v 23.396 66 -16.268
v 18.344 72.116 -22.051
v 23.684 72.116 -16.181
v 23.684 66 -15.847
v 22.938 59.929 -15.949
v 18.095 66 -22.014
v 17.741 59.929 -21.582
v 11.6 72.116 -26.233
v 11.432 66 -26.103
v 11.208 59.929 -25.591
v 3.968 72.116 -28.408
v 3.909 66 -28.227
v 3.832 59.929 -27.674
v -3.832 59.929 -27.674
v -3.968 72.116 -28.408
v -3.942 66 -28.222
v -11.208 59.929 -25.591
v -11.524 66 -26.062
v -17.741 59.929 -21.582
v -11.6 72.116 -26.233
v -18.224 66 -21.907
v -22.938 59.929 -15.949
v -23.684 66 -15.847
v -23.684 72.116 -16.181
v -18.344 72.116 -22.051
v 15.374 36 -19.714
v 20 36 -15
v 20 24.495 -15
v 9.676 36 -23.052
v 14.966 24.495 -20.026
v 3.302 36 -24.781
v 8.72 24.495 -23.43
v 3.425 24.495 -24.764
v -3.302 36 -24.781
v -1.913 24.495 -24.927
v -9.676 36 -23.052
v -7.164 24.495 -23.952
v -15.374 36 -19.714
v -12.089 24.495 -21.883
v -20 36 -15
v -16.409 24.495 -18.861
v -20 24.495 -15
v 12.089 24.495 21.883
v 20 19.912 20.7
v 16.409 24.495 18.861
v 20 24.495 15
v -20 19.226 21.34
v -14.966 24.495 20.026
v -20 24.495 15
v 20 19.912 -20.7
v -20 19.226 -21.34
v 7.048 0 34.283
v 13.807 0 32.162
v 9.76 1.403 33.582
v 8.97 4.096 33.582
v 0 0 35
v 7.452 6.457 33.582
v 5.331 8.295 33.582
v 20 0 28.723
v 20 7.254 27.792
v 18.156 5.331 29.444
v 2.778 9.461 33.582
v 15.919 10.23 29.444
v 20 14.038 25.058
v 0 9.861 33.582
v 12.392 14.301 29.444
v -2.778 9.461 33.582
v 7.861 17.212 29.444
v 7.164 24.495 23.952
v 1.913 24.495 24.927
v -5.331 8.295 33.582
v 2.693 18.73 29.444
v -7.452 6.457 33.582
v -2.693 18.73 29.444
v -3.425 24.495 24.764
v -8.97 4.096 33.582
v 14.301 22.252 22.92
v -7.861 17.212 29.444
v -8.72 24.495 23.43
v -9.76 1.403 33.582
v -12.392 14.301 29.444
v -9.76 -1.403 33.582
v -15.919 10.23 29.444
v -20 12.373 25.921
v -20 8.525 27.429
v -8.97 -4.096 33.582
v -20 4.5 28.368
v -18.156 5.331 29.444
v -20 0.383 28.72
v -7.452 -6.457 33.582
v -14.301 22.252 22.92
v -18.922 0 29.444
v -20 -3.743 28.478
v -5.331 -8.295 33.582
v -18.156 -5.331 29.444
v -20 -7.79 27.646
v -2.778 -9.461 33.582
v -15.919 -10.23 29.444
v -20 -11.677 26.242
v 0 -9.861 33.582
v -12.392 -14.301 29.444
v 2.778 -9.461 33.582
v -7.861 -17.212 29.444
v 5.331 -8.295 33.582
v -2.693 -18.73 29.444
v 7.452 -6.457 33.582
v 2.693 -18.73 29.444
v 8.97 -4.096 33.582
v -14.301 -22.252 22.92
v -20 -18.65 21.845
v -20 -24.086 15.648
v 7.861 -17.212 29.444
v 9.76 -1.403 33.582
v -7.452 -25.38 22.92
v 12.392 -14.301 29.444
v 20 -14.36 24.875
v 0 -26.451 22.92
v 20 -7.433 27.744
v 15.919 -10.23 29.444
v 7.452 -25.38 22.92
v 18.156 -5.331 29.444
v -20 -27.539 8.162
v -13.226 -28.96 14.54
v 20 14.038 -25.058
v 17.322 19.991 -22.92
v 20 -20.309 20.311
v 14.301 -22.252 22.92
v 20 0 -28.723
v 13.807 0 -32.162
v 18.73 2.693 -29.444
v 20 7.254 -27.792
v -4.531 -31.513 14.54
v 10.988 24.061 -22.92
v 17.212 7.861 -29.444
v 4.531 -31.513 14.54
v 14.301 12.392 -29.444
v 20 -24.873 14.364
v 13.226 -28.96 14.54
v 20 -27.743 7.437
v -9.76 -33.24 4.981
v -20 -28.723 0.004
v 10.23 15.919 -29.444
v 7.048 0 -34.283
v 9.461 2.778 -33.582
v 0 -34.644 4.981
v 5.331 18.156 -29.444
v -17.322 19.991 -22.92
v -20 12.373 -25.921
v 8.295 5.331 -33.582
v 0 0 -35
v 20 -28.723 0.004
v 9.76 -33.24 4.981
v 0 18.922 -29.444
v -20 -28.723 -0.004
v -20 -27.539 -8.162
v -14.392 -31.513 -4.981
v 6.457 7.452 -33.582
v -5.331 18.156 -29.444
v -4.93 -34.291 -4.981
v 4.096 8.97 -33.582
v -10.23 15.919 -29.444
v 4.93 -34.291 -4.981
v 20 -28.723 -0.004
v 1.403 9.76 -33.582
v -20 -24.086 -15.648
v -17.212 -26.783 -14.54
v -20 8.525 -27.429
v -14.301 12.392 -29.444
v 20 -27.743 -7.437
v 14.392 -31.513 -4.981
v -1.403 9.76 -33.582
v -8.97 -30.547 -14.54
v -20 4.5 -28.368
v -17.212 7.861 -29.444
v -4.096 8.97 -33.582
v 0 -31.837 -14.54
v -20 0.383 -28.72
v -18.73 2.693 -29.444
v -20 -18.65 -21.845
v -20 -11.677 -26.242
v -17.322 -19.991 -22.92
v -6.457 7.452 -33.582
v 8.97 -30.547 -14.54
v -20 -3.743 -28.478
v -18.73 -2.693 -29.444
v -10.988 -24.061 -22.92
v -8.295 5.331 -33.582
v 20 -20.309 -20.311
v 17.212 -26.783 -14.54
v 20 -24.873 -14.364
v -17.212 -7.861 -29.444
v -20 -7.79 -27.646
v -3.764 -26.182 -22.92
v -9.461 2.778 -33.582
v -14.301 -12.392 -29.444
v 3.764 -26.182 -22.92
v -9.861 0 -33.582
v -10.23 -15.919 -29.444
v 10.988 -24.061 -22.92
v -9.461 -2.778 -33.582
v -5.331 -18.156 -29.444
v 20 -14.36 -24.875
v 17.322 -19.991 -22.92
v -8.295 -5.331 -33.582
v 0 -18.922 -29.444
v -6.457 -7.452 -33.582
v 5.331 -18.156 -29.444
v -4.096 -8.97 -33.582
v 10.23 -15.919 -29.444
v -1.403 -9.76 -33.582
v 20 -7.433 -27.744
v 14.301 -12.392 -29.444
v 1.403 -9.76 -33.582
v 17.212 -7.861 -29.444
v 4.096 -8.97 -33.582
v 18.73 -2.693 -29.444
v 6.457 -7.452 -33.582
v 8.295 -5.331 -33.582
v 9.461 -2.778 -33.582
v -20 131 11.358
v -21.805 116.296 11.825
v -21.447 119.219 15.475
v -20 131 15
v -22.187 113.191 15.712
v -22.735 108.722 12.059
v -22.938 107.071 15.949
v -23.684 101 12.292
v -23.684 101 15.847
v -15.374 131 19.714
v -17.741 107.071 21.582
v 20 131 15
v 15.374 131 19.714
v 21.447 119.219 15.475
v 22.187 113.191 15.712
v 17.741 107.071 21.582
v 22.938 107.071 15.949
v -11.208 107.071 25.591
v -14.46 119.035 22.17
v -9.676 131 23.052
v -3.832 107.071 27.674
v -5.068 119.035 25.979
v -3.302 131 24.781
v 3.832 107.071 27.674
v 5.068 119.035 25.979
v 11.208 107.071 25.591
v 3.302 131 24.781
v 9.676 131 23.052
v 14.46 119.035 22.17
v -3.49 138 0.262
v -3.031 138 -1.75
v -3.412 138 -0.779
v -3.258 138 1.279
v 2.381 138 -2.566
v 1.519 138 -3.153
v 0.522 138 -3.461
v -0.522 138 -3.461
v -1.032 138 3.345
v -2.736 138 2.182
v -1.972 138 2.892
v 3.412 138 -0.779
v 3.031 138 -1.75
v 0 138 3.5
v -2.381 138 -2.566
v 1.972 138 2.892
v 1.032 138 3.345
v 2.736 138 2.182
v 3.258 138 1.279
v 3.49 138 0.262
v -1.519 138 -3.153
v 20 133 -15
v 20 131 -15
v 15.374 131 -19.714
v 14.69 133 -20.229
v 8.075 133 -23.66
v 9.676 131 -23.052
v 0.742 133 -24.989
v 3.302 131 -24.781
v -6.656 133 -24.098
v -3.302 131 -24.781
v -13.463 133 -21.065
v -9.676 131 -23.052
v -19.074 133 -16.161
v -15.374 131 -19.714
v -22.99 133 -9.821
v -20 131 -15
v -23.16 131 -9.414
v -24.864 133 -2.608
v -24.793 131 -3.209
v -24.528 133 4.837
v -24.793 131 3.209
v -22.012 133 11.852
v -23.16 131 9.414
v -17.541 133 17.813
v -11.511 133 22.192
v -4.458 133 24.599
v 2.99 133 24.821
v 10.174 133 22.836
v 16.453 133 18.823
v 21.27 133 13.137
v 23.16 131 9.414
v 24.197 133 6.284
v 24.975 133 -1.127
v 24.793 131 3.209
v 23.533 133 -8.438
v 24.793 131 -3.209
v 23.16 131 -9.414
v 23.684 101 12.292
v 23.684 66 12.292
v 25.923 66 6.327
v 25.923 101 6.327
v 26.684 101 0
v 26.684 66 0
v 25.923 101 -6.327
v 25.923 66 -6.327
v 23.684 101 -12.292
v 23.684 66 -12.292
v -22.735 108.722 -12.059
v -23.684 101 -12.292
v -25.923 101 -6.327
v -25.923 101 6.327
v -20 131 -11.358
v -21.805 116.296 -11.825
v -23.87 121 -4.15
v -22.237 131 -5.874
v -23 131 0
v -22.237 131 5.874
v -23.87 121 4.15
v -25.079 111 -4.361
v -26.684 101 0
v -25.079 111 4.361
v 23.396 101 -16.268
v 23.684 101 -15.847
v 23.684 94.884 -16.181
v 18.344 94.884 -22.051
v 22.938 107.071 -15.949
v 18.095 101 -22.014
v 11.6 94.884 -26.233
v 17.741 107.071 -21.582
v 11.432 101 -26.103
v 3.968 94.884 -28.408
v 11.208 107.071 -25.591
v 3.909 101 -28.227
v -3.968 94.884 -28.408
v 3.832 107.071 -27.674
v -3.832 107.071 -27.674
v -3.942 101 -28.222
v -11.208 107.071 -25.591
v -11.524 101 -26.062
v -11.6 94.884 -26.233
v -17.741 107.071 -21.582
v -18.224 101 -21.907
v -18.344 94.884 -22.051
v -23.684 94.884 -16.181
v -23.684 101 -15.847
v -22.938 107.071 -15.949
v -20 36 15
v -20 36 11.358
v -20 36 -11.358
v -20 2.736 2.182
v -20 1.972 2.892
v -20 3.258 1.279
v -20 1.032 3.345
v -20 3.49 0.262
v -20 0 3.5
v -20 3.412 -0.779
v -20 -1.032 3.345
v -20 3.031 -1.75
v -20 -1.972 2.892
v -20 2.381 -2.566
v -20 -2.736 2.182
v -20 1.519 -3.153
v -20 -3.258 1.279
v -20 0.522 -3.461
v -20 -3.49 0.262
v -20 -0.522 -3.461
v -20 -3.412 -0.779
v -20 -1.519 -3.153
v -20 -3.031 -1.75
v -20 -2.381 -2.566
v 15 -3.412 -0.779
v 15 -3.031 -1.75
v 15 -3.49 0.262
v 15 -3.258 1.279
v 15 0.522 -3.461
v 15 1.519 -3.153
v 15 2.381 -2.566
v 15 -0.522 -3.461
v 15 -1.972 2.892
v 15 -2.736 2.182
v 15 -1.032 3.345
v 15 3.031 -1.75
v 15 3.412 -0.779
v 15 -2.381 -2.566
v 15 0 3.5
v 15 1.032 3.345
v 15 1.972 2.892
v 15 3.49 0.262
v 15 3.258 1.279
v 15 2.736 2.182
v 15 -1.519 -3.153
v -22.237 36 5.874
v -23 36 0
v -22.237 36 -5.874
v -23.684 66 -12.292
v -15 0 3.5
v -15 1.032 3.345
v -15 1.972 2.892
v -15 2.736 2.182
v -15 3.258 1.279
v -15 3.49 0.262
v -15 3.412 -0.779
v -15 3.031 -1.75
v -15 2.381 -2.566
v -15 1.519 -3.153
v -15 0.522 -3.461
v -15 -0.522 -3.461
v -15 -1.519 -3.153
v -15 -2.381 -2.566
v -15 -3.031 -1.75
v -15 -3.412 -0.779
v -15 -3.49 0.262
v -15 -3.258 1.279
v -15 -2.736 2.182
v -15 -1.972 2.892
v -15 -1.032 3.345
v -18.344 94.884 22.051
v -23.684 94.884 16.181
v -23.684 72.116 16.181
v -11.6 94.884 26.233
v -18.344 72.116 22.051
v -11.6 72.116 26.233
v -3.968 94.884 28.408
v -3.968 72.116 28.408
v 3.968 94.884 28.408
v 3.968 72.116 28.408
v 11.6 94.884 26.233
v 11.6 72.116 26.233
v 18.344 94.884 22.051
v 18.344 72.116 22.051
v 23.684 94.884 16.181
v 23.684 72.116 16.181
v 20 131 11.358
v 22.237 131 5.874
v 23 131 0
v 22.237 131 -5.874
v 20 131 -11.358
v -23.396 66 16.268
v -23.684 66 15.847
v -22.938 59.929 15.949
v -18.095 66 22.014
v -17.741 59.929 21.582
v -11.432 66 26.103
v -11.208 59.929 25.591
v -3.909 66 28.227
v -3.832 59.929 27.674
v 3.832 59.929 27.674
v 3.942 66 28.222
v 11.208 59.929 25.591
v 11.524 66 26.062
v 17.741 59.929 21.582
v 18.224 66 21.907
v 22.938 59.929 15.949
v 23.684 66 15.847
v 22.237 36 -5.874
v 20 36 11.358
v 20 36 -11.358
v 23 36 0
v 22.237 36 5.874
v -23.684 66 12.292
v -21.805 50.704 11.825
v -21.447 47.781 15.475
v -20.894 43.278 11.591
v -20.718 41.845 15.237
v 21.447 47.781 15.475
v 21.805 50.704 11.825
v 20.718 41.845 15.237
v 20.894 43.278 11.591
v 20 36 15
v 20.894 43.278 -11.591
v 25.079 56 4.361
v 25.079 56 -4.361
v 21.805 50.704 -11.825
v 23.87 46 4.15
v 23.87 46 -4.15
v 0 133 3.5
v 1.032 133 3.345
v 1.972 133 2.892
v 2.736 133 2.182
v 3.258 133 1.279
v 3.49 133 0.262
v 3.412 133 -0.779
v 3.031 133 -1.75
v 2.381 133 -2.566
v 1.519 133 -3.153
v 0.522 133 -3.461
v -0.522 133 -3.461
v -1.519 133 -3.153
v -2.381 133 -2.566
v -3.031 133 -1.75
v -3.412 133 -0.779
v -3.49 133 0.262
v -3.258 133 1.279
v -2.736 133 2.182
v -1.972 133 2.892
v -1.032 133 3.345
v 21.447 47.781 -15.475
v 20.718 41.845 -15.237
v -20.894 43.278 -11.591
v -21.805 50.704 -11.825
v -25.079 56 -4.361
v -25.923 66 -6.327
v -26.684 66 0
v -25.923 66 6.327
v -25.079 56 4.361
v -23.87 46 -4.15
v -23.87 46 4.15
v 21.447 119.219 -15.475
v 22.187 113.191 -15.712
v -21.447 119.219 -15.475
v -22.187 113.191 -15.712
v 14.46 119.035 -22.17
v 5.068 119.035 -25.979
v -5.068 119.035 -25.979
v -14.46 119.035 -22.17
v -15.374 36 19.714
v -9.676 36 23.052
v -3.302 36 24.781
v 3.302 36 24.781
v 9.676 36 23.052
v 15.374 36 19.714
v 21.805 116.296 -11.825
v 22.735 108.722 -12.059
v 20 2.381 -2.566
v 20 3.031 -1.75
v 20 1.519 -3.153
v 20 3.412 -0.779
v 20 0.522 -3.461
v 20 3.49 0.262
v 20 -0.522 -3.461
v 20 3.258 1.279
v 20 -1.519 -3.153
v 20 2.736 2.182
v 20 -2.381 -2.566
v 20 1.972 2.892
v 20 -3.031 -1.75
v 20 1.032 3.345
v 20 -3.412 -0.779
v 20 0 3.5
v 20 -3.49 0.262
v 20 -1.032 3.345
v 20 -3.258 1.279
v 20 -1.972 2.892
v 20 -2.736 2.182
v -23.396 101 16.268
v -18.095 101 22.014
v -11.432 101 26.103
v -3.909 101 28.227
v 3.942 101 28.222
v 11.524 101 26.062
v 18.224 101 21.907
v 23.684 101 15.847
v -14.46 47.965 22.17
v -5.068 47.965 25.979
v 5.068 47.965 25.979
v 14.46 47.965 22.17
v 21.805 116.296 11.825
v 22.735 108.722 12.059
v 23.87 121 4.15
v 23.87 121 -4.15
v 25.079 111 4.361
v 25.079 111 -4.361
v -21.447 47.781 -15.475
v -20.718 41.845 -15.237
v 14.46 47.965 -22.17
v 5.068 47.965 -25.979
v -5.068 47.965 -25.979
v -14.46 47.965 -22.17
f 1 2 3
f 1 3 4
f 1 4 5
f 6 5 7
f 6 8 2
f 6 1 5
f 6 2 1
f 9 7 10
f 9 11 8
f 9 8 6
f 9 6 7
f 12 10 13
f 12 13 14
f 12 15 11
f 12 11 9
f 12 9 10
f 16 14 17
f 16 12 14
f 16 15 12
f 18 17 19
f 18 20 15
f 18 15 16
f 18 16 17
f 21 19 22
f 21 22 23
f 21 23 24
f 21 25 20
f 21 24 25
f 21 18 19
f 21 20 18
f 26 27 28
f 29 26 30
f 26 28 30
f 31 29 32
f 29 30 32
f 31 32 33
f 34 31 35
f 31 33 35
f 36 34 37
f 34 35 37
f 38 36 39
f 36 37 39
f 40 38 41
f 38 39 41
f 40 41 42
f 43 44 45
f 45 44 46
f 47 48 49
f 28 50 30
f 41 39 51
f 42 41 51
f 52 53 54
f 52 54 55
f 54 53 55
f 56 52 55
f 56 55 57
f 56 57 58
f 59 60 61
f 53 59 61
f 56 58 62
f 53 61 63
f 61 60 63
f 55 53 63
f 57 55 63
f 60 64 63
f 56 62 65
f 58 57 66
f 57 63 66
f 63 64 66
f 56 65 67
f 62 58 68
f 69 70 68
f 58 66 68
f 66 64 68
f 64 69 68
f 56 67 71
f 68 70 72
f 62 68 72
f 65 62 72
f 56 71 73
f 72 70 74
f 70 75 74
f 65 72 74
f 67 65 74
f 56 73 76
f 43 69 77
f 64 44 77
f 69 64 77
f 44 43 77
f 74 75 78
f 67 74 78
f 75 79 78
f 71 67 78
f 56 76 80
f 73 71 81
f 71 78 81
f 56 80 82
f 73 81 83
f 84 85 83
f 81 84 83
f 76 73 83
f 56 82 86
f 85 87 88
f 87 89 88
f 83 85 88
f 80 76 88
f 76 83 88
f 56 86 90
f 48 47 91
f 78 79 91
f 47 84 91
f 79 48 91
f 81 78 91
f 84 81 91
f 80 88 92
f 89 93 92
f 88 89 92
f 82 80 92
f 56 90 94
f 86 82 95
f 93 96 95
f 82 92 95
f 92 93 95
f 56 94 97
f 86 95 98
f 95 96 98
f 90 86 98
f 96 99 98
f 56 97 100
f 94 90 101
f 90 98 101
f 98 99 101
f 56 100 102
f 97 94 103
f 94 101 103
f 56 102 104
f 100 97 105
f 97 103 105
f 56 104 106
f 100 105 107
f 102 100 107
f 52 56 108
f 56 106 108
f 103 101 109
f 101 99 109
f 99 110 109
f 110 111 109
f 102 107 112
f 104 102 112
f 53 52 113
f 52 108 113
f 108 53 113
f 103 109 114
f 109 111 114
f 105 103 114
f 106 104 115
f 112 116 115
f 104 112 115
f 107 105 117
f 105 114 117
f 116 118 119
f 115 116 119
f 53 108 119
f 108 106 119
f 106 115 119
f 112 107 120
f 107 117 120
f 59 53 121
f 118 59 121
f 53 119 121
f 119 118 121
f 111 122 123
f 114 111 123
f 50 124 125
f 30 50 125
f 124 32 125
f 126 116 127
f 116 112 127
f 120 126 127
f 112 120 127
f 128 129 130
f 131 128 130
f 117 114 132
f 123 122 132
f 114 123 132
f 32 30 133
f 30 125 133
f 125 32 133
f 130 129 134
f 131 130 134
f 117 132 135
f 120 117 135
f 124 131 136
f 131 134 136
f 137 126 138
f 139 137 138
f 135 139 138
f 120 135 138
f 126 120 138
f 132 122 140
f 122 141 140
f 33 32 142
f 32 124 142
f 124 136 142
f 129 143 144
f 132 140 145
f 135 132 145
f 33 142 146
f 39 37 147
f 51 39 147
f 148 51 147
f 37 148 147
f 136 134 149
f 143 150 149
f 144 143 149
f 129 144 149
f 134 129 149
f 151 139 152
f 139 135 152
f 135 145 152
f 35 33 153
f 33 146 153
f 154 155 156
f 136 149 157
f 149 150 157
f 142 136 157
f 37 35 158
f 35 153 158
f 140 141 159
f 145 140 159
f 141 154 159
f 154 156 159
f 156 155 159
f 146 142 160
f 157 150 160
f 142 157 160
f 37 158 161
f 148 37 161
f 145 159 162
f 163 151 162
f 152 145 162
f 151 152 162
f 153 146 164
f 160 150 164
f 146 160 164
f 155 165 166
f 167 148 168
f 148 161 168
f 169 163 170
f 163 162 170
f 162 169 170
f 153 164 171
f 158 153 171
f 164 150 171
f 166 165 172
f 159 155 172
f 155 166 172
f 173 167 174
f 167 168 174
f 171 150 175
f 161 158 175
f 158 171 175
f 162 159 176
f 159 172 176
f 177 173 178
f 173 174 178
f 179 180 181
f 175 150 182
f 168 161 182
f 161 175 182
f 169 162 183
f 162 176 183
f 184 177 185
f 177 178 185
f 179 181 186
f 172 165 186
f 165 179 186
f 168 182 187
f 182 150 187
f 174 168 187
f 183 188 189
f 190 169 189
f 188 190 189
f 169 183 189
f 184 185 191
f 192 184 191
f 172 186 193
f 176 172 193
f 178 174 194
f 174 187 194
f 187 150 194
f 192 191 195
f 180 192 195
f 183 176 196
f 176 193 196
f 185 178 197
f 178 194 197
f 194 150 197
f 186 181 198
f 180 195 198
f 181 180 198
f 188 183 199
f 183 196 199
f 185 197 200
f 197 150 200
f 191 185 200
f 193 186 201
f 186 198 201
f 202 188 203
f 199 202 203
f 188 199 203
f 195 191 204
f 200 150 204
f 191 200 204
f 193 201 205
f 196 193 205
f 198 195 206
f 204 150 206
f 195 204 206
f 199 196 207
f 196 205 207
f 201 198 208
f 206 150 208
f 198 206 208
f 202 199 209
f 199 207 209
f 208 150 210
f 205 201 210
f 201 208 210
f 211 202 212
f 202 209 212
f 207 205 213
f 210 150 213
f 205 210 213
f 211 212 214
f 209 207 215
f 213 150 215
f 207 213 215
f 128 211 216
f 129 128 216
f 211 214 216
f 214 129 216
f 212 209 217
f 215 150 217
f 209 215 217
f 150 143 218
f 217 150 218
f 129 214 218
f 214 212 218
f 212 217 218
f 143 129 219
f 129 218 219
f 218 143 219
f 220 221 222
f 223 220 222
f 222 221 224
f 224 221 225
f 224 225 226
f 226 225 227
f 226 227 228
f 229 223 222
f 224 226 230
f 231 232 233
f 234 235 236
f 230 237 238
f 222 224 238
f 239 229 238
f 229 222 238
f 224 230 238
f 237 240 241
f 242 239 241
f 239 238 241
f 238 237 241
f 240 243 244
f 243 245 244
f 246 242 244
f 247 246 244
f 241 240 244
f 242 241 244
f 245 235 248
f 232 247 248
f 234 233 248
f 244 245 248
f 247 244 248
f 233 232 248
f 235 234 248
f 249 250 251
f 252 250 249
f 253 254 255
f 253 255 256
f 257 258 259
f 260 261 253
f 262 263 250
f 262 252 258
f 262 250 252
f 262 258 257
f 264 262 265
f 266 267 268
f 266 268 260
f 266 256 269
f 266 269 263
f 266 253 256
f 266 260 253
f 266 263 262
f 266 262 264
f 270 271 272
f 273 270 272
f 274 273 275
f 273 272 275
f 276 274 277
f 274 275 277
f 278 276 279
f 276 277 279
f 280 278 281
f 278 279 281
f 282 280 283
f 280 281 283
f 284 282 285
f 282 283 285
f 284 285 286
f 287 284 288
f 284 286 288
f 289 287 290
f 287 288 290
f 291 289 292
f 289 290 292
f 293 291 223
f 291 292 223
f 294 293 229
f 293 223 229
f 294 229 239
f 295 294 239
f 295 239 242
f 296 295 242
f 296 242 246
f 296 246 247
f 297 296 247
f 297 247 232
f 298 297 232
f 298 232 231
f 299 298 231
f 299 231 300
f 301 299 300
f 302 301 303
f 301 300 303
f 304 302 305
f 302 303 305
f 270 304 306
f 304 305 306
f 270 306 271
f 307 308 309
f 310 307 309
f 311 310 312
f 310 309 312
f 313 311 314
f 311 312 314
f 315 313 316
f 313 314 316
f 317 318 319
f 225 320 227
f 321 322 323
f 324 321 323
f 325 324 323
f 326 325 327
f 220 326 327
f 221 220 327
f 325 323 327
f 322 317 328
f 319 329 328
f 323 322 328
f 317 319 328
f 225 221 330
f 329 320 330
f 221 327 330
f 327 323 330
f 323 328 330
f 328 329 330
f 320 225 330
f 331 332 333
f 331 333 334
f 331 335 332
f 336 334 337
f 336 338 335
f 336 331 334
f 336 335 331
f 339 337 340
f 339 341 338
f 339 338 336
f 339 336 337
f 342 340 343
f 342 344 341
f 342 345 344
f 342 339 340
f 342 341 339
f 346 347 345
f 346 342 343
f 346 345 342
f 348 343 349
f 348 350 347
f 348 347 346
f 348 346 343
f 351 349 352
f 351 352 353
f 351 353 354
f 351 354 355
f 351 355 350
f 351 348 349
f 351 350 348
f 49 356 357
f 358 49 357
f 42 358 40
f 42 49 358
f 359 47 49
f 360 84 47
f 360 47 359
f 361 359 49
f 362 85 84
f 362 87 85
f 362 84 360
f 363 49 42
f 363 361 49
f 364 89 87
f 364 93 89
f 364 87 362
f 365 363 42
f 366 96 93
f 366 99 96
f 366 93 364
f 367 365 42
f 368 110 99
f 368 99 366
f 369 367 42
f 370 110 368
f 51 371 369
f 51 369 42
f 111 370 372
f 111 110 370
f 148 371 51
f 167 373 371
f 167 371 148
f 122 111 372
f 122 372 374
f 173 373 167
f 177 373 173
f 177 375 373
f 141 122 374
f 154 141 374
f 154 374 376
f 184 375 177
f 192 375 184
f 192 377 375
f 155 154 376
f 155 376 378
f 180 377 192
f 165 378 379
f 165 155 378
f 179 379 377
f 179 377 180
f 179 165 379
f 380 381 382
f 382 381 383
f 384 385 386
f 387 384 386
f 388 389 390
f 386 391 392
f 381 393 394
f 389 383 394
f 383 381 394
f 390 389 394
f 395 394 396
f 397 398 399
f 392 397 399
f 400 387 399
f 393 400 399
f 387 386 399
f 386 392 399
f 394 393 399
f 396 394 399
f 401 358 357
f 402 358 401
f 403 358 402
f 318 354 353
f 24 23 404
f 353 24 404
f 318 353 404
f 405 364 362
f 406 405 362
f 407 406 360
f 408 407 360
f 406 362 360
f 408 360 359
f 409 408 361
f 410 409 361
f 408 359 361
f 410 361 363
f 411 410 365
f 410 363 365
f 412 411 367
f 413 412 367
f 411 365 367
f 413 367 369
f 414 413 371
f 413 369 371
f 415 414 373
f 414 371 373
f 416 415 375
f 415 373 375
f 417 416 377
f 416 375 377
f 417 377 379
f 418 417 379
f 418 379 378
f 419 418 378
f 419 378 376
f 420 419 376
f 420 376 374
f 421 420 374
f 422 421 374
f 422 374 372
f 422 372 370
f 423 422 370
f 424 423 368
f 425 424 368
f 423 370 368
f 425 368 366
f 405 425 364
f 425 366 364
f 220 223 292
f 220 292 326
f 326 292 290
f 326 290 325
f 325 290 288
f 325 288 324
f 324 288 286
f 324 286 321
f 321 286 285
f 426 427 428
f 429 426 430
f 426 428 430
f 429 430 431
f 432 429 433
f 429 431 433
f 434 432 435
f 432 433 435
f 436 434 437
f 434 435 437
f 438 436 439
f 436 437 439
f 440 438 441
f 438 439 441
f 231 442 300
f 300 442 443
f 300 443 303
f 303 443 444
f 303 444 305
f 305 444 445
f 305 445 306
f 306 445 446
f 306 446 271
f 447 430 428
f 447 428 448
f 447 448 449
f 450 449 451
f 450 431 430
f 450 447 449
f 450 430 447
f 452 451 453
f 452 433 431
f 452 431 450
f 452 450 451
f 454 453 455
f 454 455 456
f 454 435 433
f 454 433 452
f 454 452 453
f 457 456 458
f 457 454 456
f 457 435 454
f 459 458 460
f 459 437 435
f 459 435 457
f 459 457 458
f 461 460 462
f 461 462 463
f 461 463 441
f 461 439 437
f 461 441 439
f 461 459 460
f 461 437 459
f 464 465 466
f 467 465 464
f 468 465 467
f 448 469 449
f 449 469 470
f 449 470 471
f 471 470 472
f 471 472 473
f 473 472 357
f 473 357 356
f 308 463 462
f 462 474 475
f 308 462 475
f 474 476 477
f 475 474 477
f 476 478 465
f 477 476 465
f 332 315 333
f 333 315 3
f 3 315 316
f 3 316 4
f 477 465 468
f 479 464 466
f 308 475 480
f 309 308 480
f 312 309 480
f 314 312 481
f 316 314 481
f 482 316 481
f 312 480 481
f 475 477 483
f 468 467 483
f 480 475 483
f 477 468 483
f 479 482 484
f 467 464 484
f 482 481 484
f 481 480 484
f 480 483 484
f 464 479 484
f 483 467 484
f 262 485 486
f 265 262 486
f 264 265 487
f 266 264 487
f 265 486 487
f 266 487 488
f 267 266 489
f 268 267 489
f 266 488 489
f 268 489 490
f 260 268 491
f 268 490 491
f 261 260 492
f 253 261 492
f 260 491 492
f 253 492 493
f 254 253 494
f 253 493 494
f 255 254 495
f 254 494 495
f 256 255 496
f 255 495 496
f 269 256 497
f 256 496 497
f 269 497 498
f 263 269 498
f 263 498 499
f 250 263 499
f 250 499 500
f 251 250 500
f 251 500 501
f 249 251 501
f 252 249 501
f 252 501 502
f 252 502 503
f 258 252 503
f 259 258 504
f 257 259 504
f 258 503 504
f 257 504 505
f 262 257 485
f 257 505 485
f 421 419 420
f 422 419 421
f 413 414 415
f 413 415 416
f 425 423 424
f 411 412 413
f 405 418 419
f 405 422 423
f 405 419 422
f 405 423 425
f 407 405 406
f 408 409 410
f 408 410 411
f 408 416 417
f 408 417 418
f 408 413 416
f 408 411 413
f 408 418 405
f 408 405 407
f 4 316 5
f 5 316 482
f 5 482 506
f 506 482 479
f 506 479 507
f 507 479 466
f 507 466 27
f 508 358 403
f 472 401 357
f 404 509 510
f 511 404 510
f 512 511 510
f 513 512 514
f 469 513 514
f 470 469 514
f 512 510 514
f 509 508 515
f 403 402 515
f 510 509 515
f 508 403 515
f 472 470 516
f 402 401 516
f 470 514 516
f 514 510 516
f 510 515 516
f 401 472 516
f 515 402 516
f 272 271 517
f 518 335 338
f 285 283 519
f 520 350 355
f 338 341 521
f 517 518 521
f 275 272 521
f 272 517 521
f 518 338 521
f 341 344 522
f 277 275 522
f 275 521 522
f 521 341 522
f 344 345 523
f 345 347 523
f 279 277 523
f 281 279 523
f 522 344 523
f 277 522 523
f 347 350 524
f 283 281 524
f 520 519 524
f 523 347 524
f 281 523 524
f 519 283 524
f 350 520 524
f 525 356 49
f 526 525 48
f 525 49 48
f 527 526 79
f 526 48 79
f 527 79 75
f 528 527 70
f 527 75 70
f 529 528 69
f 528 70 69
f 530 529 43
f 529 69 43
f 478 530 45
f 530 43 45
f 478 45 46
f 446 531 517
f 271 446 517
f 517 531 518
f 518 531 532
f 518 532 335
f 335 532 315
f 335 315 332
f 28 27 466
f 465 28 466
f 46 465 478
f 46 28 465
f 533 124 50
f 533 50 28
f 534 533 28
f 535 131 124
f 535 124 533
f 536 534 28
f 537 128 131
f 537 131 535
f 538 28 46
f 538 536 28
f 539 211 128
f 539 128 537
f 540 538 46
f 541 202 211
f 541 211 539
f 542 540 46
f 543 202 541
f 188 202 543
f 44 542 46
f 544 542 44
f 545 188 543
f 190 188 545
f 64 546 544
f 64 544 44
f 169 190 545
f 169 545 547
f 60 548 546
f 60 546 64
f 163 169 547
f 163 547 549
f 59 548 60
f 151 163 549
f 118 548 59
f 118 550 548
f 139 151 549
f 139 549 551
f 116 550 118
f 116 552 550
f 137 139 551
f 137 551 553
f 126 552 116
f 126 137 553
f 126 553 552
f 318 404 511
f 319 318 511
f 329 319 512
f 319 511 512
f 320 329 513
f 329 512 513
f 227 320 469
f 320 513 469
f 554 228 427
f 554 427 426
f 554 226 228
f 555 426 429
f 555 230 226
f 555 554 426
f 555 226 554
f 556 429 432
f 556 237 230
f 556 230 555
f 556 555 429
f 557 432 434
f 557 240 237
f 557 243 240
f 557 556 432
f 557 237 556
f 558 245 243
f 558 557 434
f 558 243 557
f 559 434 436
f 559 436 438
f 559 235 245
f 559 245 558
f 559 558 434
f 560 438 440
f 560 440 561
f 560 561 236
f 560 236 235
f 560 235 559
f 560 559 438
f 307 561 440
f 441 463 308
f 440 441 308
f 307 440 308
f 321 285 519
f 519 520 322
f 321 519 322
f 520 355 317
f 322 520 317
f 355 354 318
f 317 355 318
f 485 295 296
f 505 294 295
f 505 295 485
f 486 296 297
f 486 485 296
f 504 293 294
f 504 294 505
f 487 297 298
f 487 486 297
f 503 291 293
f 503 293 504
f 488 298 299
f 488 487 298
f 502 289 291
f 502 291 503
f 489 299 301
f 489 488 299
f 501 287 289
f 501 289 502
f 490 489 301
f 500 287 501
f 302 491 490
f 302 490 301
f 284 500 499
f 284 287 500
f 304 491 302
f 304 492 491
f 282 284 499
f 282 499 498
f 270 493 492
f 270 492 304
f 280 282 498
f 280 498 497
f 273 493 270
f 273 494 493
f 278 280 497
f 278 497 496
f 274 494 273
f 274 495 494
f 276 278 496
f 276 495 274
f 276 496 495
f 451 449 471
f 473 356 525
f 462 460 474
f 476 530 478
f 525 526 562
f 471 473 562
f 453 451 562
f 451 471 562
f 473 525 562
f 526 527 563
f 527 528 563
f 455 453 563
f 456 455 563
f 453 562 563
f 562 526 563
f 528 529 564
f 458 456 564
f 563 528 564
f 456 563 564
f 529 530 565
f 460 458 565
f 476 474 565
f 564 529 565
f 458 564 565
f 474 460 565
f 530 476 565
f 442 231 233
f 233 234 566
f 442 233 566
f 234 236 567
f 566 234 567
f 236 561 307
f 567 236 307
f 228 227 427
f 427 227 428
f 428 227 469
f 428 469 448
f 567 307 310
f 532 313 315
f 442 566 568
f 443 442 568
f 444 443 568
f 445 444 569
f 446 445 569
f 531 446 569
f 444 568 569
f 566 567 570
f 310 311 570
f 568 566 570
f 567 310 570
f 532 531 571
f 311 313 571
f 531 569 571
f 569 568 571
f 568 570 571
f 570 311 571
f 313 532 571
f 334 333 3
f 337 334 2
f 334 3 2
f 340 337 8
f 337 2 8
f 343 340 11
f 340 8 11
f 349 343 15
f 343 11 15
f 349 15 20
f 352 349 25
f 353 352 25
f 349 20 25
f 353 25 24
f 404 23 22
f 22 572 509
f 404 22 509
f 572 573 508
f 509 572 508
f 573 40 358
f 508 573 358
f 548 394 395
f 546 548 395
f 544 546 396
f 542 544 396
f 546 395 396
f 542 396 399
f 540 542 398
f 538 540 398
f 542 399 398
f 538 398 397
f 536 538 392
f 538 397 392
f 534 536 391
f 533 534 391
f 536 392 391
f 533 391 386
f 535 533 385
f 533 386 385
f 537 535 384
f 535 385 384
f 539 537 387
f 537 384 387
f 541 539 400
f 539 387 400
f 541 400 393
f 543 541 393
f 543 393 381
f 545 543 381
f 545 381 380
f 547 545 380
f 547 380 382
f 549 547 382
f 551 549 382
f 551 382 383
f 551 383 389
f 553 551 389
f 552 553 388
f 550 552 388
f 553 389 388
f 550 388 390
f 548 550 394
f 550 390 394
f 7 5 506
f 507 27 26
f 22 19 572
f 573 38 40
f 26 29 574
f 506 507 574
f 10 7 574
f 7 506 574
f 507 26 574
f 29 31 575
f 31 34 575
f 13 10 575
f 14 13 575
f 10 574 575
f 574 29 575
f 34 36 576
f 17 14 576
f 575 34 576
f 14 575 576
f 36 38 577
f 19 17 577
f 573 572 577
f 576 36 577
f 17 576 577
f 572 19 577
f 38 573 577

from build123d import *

# Parameters (mm, degrees)
CUT_EXTRUDE1_START  = -28.722813
SKETCH2_OUTSIDE_W   = 96.248
SKETCH2_OUTSIDE_H   = 96.248
CUT_EXTRUDE1_DEPTH  = 57.445626
BOSS_EXTRUDE1_DEPTH = 36
SKETCH4_R           = 3.5
CUT_EXTRUDE2_DEPTH  = 5
LPATTERN1_COUNT     = 2
LPATTERN1_PITCH     = 35
BOSS_EXTRUDE2_DEPTH = 30
BOSS_EXTRUDE2_DRAFT = -7
BOSS_EXTRUDE6_DEPTH = 35
BOSS_EXTRUDE9_DEPTH = 30
BOSS_EXTRUDE9_DRAFT = 7
SKETCH10_R          = 25
BOSS_EXTRUDE7_DEPTH = 2
SKETCH11_R          = 3.5
BOSS_EXTRUDE8_DEPTH = 5
FILLET3_R           = 100


with BuildPart() as part:
    # Sketch1 → Revolve2 (revolve)
    with BuildSketch(Plane(origin=(0, 0, 0), x_dir=(1, 0, 0), z_dir=(0, 1, 0))):
        with BuildLine():
            Line((0, 35), (0, -35))
            ThreePointArc((0, -35), (35, 0), (0, 35))
        make_face()
    revolve(axis=Axis((0, 0, -35), (0, 0, 1)))

    # Sketch2 outside → Cut-Extrude1 (cut)
    with BuildSketch(Plane(origin=(0, 0, 0), x_dir=(1, 0, 0), z_dir=(0, 1, 0)).offset(CUT_EXTRUDE1_START)):
        Rectangle(SKETCH2_OUTSIDE_W, SKETCH2_OUTSIDE_H)
        with BuildLine():
            Line((-20, -28.722813233), (-20, 28.722813233))
            ThreePointArc((-20, 28.722813233), (0, 35), (20, 28.722813233))
            Line((20, 28.722813233), (20, -28.722813233))
            ThreePointArc((20, -28.722813233), (0, -35), (-20, -28.722813233))
        make_face(mode=Mode.SUBTRACT)
    extrude(amount=CUT_EXTRUDE1_DEPTH, mode=Mode.SUBTRACT)

    # Sketch3 → Boss-Extrude1 (add)
    with BuildSketch(Plane(origin=(0, 0, 0), x_dir=(1, 0, 0), z_dir=(0, 1, 0))):
        with BuildLine():
            Line((-20, 15), (-20, -15))
            ThreePointArc((-20, -15), (0, -25), (20, -15))
            Line((20, -15), (20, 15))
            ThreePointArc((20, 15), (0, 25), (-20, 15))
        make_face()
    extrude(amount=BOSS_EXTRUDE1_DEPTH)

    # Sketch4 → Cut-Extrude2 (cut)
    with BuildSketch(Plane.ZY.offset(20)):
        Circle(SKETCH4_R)
    cut_extrude2 = extrude(amount=-CUT_EXTRUDE2_DEPTH, mode=Mode.SUBTRACT)

    # LPattern1: Cut-Extrude2 ×2
    with Locations(*[(i * LPATTERN1_PITCH, 0, 0) for i in range(1, LPATTERN1_COUNT)]):
        add(cut_extrude2, mode=Mode.SUBTRACT)


with BuildPart() as boss_extrude2_tool:
    # Sketch5 → Boss-Extrude2 (with draft: the straight prism first)
    with BuildSketch(Plane(origin=(0, 36, 0), x_dir=(1, 0, 0), z_dir=(0, 1, 0))):
        with BuildLine():
            Line((-20, 15), (-20, 11.357816692))
            ThreePointArc((-20, 11.357816692), (-23, 0), (-20, -11.357816692))
            Line((-20, -11.357816692), (-20, -15))
            ThreePointArc((-20, -15), (0, -25), (20, -15))
            Line((20, -15), (20, -11.357816692))
            ThreePointArc((20, -11.357816692), (23, 0), (20, 11.357816692))
            Line((20, 11.357816692), (20, 15))
            ThreePointArc((20, 15), (0, 25), (-20, 15))
        make_face()
    extrude(amount=BOSS_EXTRUDE2_DEPTH)
    # Boss-Extrude2: the draft: its side faces are tilted about the plane it starts from
    boss_extrude2_sides = [boss_extrude2_tool.faces().sort_by_distance(p)[0] for p in [
        (20, 51, -13.178908346),
        (0, 51, -25),
        (-20, 51, -13.178908346),
        (-23, 51, 0),
        (-20, 51, 13.178908346),
        (0, 51, 25),
        (20, 51, 13.178908346),
        (23, 51, 0),
    ]]
    draft(boss_extrude2_sides, Plane(origin=(0, 36, 0), x_dir=(1, 0, 0), z_dir=(0, 1, 0)), BOSS_EXTRUDE2_DRAFT)


with BuildPart() as part_1:
    add(part.part)

    # Boss-Extrude2: add boss_extrude2_tool
    add(boss_extrude2_tool.part)

    # Sketch9 → Boss-Extrude6 (add)
    with BuildSketch(Plane(origin=(0, 66, 0), x_dir=(1, 0, 0), z_dir=(0, 1, 0))):
        with BuildLine():
            Line((23.683536827, 12.29232366), (23.683536827, 16.181327766))
            ThreePointArc((23.683536827, 16.181327766), (0, 28.683536827), (-23.683536827, 16.181327766))
            Line((-23.683536827, 16.181327766), (-23.683536827, 12.29232366))
            ThreePointArc((-23.683536827, 12.29232366), (-26.683536827, 0), (-23.683536827, -12.29232366))
            Line((-23.683536827, -12.29232366), (-23.683536827, -16.181327766))
            ThreePointArc((-23.683536827, -16.181327766), (0, -28.683536827), (23.683536827, -16.181327766))
            Line((23.683536827, -16.181327766), (23.683536827, -12.29232366))
            ThreePointArc((23.683536827, -12.29232366), (26.683536827, 0), (23.683536827, 12.29232366))
        make_face()
    extrude(amount=BOSS_EXTRUDE6_DEPTH)


with BuildPart() as boss_extrude9_tool:
    # Sketch12 → Boss-Extrude9 (with draft: the straight prism first)
    with BuildSketch(Plane(origin=(0, 101, 0), x_dir=(1, 0, 0), z_dir=(0, 1, 0))):
        with BuildLine():
            Line((23.683536827, 12.29232366), (23.683536827, 16.181327766))
            ThreePointArc((23.683536827, 16.181327766), (0, 28.683536827), (-23.683536827, 16.181327766))
            Line((-23.683536827, 16.181327766), (-23.683536827, 12.29232366))
            ThreePointArc((-23.683536827, 12.29232366), (-26.683536827, 0), (-23.683536827, -12.29232366))
            Line((-23.683536827, -12.29232366), (-23.683536827, -16.181327766))
            ThreePointArc((-23.683536827, -16.181327766), (0, -28.683536827), (23.683536827, -16.181327766))
            Line((23.683536827, -16.181327766), (23.683536827, -12.29232366))
            ThreePointArc((23.683536827, -12.29232366), (26.683536827, 0), (23.683536827, 12.29232366))
        make_face()
    extrude(amount=BOSS_EXTRUDE9_DEPTH)
    # Boss-Extrude9: the draft: its side faces are tilted about the plane it starts from
    boss_extrude9_sides = [boss_extrude9_tool.faces().sort_by_distance(p)[0] for p in [
        (0, 116, 28.683536827),
        (23.683536827, 116, 14.236825713),
        (26.683536827, 116, 0),
        (23.683536827, 116, -14.236825713),
        (0, 116, -28.683536827),
        (-23.683536827, 116, -14.236825713),
        (-26.683536827, 116, 0),
        (-23.683536827, 116, 14.236825713),
    ]]
    draft(boss_extrude9_sides, Plane(origin=(0, 101, 0), x_dir=(1, 0, 0), z_dir=(0, 1, 0)), BOSS_EXTRUDE9_DRAFT)


with BuildPart() as part_2:
    add(part_1.part)

    # Boss-Extrude9: add boss_extrude9_tool
    add(boss_extrude9_tool.part)

    # Sketch10 → Boss-Extrude7 (add)
    with BuildSketch(Plane(origin=(0, 131, 0), x_dir=(1, 0, 0), z_dir=(0, 1, 0))):
        with Locations(Location((0, 0, 0), (0, 0, 36.869897646))):
            Circle(SKETCH10_R)
    extrude(amount=BOSS_EXTRUDE7_DEPTH)

    # Sketch11 → Boss-Extrude8 (add)
    with BuildSketch(Plane(origin=(0, 133, 0), x_dir=(1, 0, 0), z_dir=(0, 1, 0))):
        with Locations(Location((0, 0, 0), (0, 0, 270))):
            Circle(SKETCH11_R)
    extrude(amount=BOSS_EXTRUDE8_DEPTH)

    # Fillet3
    # the kernel refuses this fillet: 100 mm, written as the material it takes off along each edge
    with BuildSketch(Plane(origin=(0, 66, 0), x_dir=(0.9978245122586105, 0, -0.06592603989218485), z_dir=(0.06592603989218485, 0, 0.9978245122586105))) as fillet3_piece_1:
        with BuildLine():
            CenterArc((28.683536827 - FILLET3_R, FILLET3_R * 0.0611626201505), FILLET3_R, 353, 7)
            Line((28.683536827, FILLET3_R * 0.0611626201505), (28.683536827, 0))
            Line((28.683536827, 0), (28.683536827 - FILLET3_R * 0.00745384835868, -FILLET3_R * 0.0607067232547))
        make_face()
    revolve(axis=Axis((0, 66, 0), (0, 1, 0)), revolution_arc=172.439949247, mode=Mode.SUBTRACT)
    with BuildSketch(Plane(origin=(0, 101, 0), x_dir=(0.9978245122586106, 0, -0.06592603989218539), z_dir=(0.06592603989218539, 0, 0.9978245122586106))) as fillet3_piece_2:
        with BuildLine():
            CenterArc((28.683536827 - FILLET3_R, -FILLET3_R * 0.0611626201505), FILLET3_R, 0, 7)
            Line((28.683536827 - FILLET3_R * 0.00745384835868, FILLET3_R * 0.0607067232547), (28.683536827, 0))
            Line((28.683536827, 0), (28.683536827, -FILLET3_R * 0.0611626201505))
        make_face()
    revolve(axis=Axis((0, 101, 0), (0, 1, 0)), revolution_arc=172.439949247, mode=Mode.SUBTRACT)
    with BuildSketch(Plane(origin=(0, 101, 0), x_dir=(-0.9978245122586106, 0, 0.06592603989218528), z_dir=(-0.06592603989218528, 0, -0.9978245122586106))) as fillet3_piece_3:
        with BuildLine():
            CenterArc((28.683536827 - FILLET3_R, -FILLET3_R * 0.0611626201505), FILLET3_R, 0, 7)
            Line((28.683536827 - FILLET3_R * 0.00745384835868, FILLET3_R * 0.0607067232547), (28.683536827, 0))
            Line((28.683536827, 0), (28.683536827, -FILLET3_R * 0.0611626201505))
        make_face()
    revolve(axis=Axis((0, 101, 0), (0, 1, 0)), revolution_arc=172.439949247, mode=Mode.SUBTRACT)
    with BuildSketch(Plane(origin=(0, 66, 0), x_dir=(-0.9978245122586105, 0, 0.06592603989218485), z_dir=(-0.06592603989218485, 0, -0.9978245122586105))) as fillet3_piece_4:
        with BuildLine():
            CenterArc((28.683536827 - FILLET3_R, FILLET3_R * 0.0611626201505), FILLET3_R, 353, 7)
            Line((28.683536827, FILLET3_R * 0.0611626201505), (28.683536827, 0))
            Line((28.683536827, 0), (28.683536827 - FILLET3_R * 0.00745384835868, -FILLET3_R * 0.0607067232547))
        make_face()
    revolve(axis=Axis((0, 66, 0), (0, 1, 0)), revolution_arc=172.439949247, mode=Mode.SUBTRACT)


solid = part_2.part
